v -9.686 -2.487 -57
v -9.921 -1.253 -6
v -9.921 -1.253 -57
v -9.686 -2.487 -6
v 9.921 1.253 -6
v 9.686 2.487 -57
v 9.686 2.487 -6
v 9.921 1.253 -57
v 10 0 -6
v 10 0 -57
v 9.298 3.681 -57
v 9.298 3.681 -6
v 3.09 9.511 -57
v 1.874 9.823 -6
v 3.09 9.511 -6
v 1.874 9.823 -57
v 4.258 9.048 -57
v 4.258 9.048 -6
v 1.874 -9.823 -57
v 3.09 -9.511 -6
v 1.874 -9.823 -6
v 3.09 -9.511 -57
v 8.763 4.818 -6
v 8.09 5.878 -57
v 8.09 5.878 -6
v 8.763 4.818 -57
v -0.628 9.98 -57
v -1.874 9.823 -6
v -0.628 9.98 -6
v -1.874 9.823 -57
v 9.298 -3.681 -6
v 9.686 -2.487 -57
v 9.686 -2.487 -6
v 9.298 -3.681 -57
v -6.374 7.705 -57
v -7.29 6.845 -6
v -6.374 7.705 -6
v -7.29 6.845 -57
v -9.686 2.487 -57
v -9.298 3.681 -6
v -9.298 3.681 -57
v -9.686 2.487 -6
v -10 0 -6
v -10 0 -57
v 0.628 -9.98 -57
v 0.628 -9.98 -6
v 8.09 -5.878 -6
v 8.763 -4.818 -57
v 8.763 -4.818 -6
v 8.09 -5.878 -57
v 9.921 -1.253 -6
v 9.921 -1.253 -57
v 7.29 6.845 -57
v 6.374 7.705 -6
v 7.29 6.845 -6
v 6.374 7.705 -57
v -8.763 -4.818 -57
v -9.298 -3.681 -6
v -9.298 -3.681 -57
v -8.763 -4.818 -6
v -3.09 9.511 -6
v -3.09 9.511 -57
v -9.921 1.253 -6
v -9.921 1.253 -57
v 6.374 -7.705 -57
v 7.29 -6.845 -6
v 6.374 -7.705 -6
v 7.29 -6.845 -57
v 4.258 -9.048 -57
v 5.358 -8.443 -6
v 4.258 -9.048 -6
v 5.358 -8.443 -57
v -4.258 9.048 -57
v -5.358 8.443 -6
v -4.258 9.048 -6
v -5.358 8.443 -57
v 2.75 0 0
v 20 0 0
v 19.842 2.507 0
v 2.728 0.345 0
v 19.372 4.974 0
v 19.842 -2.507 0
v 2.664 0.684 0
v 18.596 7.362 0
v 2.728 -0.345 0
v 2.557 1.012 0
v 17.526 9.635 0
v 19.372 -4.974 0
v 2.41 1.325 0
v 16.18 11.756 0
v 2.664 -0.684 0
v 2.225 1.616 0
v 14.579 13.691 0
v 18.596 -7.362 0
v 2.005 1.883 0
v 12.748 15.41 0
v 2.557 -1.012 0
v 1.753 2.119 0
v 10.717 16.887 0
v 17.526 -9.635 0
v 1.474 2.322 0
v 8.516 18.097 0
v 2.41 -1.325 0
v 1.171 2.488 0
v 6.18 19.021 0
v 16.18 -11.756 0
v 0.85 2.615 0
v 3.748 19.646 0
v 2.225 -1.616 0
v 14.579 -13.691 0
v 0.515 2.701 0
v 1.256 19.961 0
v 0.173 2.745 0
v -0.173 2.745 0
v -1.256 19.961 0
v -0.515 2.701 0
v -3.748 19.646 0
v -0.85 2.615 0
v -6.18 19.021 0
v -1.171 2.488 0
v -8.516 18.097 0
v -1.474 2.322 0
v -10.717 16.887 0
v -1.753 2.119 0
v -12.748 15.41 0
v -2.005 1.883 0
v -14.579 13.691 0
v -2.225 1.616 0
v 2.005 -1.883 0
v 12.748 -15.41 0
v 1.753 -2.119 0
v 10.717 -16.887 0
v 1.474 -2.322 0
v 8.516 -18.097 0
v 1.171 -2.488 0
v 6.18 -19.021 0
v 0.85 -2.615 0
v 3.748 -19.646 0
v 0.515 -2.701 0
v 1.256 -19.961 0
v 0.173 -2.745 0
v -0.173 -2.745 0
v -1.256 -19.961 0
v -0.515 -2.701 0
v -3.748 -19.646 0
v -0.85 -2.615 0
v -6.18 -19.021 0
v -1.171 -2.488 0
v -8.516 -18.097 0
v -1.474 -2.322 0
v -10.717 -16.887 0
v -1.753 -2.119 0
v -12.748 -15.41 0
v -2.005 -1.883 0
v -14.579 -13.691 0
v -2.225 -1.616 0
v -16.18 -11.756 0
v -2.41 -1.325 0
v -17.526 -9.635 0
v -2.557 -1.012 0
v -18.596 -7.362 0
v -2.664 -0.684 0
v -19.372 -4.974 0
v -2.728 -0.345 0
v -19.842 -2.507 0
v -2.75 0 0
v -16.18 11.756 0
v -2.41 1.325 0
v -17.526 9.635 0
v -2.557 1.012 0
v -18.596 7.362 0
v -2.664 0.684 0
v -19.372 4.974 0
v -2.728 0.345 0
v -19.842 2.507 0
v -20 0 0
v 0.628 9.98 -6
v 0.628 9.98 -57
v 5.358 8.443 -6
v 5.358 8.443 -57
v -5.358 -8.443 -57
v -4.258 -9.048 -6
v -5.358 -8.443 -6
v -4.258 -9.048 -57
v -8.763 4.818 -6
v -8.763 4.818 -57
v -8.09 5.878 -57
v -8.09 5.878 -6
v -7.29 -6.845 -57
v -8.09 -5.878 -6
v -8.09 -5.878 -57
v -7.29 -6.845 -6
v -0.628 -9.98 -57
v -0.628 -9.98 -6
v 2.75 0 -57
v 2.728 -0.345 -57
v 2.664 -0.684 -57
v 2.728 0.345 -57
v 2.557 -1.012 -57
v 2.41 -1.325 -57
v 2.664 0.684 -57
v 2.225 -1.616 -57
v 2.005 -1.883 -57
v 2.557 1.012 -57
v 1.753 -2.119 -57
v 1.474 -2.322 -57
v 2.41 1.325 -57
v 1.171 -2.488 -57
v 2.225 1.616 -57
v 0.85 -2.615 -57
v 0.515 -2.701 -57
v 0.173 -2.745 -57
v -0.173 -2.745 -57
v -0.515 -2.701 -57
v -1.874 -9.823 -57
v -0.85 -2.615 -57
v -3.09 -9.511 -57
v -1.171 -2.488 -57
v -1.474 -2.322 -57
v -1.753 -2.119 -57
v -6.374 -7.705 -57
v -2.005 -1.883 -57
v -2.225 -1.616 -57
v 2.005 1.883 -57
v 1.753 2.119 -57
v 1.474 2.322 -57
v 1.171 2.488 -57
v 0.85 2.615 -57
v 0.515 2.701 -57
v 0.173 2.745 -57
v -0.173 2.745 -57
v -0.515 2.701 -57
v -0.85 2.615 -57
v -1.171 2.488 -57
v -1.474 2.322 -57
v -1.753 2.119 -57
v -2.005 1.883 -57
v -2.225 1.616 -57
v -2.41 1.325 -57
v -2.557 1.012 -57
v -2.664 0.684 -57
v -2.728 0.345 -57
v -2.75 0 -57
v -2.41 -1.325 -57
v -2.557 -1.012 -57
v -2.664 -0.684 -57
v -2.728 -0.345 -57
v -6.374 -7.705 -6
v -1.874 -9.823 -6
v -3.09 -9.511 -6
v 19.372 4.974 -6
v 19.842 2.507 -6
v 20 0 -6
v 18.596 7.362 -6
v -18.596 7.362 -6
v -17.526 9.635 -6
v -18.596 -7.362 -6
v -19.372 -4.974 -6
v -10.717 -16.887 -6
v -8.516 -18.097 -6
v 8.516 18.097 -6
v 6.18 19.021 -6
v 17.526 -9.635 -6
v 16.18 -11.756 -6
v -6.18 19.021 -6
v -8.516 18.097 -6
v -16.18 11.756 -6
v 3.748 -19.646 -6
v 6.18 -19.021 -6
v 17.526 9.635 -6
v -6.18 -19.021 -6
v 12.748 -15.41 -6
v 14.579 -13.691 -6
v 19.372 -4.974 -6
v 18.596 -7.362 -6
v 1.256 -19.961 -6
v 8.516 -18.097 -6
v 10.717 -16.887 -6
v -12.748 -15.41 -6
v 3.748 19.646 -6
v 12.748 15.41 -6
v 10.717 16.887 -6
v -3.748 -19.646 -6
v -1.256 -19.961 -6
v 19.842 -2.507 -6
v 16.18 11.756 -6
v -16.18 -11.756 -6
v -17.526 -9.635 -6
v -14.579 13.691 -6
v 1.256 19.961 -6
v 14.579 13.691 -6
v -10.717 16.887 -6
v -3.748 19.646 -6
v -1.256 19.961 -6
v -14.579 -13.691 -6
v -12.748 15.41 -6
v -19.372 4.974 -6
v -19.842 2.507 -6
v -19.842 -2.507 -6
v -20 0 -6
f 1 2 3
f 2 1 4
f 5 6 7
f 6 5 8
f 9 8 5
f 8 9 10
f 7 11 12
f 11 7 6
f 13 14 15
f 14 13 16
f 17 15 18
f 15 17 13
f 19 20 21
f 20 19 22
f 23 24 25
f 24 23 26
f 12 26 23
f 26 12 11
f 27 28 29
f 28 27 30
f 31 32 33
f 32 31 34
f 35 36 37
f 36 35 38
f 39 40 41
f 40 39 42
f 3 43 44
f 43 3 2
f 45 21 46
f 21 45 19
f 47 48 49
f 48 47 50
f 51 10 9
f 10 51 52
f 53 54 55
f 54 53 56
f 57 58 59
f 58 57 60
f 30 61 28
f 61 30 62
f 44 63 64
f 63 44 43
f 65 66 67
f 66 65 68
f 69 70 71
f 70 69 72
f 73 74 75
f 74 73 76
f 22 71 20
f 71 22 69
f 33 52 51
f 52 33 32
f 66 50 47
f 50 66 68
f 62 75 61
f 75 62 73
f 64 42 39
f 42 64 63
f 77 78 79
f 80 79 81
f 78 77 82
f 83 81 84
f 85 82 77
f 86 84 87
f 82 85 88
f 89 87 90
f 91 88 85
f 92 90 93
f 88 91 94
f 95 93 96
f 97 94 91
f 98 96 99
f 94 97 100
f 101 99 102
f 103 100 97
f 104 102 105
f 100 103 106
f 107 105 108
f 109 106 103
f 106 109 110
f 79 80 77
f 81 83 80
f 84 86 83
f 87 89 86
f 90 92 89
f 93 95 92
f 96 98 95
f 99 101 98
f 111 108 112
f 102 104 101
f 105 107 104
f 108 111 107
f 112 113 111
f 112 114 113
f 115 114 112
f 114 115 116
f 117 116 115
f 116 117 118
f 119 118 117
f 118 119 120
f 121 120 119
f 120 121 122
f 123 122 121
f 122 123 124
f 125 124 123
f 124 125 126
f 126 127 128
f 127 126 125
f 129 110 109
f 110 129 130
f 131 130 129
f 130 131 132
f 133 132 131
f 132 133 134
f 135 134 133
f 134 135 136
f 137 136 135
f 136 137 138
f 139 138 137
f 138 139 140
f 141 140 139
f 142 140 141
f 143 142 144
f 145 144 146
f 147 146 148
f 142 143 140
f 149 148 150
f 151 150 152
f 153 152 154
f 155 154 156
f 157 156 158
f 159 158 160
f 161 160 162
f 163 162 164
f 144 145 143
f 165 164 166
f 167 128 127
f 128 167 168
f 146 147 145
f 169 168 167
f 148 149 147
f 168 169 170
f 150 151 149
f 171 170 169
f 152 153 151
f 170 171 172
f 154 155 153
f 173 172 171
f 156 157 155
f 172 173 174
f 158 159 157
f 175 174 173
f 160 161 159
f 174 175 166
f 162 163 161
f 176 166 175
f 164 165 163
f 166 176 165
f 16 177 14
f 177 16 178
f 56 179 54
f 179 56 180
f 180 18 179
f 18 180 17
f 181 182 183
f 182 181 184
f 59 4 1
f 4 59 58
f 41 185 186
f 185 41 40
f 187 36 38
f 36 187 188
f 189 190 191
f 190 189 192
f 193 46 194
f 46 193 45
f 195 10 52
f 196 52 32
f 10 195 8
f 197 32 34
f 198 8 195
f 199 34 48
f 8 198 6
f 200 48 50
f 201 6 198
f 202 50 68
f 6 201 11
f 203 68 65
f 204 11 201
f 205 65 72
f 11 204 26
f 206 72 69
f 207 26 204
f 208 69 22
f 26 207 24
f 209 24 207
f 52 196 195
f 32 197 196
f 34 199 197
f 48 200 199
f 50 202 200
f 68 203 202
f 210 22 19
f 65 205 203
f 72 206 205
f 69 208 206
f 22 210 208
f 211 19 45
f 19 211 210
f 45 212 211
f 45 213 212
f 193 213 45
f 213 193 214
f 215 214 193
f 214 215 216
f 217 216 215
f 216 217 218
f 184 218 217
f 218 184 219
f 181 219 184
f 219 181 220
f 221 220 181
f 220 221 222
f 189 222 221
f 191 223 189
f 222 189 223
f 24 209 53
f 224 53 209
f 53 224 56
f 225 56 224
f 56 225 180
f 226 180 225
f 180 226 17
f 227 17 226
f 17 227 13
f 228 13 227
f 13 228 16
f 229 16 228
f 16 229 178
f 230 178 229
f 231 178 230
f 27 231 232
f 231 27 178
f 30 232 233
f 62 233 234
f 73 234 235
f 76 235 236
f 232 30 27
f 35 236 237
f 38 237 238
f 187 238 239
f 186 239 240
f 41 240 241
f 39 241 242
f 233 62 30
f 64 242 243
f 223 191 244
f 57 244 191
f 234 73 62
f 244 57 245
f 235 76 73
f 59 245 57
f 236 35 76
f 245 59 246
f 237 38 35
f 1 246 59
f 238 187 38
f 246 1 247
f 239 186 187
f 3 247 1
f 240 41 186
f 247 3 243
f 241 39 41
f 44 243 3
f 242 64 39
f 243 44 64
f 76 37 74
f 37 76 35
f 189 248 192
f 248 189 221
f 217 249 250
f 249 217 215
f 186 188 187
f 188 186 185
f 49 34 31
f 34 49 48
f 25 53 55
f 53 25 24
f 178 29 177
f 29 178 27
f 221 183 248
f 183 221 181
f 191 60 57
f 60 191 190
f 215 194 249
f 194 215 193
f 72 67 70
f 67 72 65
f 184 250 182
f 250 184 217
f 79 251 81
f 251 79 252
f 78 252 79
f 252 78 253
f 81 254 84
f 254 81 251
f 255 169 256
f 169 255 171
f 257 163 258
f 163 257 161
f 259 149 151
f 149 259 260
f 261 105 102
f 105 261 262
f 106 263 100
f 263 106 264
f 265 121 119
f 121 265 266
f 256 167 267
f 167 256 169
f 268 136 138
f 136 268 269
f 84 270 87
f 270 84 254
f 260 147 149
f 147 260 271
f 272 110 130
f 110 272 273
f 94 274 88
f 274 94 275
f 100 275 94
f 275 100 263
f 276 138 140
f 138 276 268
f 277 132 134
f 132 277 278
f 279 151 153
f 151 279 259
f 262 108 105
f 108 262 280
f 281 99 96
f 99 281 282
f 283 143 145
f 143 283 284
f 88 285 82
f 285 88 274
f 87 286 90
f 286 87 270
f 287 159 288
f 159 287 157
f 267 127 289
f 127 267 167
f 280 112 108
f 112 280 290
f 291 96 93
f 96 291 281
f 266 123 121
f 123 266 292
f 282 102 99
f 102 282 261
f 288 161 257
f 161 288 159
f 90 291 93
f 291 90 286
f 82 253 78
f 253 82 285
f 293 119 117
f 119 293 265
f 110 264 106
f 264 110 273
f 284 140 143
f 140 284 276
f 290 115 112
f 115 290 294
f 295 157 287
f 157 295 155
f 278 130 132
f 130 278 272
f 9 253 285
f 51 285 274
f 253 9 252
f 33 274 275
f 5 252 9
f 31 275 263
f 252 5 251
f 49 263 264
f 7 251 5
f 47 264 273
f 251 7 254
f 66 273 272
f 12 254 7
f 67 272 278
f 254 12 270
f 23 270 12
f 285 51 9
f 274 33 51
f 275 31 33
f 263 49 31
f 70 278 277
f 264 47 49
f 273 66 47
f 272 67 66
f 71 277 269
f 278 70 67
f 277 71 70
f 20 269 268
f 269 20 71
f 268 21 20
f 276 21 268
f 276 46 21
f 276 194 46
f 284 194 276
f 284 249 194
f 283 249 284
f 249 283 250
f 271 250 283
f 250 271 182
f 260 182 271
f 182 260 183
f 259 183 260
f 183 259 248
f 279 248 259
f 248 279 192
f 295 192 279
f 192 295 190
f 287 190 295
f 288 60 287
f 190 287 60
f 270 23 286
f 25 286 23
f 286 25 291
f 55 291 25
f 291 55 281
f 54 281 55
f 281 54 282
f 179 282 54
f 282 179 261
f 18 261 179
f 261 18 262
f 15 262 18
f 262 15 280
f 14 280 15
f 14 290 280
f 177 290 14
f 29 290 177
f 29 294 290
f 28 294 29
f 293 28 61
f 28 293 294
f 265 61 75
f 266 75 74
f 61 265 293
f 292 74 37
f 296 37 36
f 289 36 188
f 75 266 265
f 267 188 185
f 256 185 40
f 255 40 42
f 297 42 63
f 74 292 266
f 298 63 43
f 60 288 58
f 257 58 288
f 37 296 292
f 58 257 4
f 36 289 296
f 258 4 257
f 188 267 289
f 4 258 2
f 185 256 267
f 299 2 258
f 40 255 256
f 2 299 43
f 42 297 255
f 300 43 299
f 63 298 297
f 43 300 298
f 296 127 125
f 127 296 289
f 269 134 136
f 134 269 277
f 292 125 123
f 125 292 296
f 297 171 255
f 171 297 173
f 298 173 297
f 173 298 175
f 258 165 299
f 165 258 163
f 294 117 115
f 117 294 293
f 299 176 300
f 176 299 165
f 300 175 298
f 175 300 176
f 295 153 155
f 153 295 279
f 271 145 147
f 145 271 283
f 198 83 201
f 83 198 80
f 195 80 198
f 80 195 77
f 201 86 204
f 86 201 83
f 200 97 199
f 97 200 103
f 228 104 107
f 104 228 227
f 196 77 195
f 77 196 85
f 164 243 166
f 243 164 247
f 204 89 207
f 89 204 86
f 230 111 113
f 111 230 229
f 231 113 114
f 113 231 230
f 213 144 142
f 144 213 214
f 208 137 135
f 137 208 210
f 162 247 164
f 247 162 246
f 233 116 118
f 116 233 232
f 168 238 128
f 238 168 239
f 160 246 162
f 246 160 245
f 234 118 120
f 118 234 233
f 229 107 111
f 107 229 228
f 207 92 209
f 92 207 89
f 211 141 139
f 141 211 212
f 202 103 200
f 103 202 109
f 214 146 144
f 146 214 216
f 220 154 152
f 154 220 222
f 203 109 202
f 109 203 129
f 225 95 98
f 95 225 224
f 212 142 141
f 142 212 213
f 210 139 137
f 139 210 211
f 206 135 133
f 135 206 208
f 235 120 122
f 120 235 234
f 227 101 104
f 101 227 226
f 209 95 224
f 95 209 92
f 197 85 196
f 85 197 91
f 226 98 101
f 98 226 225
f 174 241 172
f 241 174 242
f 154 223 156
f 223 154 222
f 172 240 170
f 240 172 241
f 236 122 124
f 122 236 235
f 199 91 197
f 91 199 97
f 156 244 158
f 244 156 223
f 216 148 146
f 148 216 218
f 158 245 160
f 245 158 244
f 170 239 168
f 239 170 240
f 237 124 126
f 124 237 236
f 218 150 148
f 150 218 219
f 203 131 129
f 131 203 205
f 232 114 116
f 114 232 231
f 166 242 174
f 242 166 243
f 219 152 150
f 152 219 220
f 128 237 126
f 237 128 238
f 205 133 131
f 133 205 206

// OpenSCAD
$fn = 50;


difference() {
	union() {
		translate(v = [0, 0, -57.0000000000]) {
			cylinder(h = 57, r = 10.0000000000);
		}
		translate(v = [0, 0, -6.0000000000]) {
			cylinder(h = 6, r = 20.0000000000);
		}
	}
	union() {
		#translate(v = [0, 0, -57]) {
			cylinder(h = 57, r = 2.7500000000);
		}
	}
}
